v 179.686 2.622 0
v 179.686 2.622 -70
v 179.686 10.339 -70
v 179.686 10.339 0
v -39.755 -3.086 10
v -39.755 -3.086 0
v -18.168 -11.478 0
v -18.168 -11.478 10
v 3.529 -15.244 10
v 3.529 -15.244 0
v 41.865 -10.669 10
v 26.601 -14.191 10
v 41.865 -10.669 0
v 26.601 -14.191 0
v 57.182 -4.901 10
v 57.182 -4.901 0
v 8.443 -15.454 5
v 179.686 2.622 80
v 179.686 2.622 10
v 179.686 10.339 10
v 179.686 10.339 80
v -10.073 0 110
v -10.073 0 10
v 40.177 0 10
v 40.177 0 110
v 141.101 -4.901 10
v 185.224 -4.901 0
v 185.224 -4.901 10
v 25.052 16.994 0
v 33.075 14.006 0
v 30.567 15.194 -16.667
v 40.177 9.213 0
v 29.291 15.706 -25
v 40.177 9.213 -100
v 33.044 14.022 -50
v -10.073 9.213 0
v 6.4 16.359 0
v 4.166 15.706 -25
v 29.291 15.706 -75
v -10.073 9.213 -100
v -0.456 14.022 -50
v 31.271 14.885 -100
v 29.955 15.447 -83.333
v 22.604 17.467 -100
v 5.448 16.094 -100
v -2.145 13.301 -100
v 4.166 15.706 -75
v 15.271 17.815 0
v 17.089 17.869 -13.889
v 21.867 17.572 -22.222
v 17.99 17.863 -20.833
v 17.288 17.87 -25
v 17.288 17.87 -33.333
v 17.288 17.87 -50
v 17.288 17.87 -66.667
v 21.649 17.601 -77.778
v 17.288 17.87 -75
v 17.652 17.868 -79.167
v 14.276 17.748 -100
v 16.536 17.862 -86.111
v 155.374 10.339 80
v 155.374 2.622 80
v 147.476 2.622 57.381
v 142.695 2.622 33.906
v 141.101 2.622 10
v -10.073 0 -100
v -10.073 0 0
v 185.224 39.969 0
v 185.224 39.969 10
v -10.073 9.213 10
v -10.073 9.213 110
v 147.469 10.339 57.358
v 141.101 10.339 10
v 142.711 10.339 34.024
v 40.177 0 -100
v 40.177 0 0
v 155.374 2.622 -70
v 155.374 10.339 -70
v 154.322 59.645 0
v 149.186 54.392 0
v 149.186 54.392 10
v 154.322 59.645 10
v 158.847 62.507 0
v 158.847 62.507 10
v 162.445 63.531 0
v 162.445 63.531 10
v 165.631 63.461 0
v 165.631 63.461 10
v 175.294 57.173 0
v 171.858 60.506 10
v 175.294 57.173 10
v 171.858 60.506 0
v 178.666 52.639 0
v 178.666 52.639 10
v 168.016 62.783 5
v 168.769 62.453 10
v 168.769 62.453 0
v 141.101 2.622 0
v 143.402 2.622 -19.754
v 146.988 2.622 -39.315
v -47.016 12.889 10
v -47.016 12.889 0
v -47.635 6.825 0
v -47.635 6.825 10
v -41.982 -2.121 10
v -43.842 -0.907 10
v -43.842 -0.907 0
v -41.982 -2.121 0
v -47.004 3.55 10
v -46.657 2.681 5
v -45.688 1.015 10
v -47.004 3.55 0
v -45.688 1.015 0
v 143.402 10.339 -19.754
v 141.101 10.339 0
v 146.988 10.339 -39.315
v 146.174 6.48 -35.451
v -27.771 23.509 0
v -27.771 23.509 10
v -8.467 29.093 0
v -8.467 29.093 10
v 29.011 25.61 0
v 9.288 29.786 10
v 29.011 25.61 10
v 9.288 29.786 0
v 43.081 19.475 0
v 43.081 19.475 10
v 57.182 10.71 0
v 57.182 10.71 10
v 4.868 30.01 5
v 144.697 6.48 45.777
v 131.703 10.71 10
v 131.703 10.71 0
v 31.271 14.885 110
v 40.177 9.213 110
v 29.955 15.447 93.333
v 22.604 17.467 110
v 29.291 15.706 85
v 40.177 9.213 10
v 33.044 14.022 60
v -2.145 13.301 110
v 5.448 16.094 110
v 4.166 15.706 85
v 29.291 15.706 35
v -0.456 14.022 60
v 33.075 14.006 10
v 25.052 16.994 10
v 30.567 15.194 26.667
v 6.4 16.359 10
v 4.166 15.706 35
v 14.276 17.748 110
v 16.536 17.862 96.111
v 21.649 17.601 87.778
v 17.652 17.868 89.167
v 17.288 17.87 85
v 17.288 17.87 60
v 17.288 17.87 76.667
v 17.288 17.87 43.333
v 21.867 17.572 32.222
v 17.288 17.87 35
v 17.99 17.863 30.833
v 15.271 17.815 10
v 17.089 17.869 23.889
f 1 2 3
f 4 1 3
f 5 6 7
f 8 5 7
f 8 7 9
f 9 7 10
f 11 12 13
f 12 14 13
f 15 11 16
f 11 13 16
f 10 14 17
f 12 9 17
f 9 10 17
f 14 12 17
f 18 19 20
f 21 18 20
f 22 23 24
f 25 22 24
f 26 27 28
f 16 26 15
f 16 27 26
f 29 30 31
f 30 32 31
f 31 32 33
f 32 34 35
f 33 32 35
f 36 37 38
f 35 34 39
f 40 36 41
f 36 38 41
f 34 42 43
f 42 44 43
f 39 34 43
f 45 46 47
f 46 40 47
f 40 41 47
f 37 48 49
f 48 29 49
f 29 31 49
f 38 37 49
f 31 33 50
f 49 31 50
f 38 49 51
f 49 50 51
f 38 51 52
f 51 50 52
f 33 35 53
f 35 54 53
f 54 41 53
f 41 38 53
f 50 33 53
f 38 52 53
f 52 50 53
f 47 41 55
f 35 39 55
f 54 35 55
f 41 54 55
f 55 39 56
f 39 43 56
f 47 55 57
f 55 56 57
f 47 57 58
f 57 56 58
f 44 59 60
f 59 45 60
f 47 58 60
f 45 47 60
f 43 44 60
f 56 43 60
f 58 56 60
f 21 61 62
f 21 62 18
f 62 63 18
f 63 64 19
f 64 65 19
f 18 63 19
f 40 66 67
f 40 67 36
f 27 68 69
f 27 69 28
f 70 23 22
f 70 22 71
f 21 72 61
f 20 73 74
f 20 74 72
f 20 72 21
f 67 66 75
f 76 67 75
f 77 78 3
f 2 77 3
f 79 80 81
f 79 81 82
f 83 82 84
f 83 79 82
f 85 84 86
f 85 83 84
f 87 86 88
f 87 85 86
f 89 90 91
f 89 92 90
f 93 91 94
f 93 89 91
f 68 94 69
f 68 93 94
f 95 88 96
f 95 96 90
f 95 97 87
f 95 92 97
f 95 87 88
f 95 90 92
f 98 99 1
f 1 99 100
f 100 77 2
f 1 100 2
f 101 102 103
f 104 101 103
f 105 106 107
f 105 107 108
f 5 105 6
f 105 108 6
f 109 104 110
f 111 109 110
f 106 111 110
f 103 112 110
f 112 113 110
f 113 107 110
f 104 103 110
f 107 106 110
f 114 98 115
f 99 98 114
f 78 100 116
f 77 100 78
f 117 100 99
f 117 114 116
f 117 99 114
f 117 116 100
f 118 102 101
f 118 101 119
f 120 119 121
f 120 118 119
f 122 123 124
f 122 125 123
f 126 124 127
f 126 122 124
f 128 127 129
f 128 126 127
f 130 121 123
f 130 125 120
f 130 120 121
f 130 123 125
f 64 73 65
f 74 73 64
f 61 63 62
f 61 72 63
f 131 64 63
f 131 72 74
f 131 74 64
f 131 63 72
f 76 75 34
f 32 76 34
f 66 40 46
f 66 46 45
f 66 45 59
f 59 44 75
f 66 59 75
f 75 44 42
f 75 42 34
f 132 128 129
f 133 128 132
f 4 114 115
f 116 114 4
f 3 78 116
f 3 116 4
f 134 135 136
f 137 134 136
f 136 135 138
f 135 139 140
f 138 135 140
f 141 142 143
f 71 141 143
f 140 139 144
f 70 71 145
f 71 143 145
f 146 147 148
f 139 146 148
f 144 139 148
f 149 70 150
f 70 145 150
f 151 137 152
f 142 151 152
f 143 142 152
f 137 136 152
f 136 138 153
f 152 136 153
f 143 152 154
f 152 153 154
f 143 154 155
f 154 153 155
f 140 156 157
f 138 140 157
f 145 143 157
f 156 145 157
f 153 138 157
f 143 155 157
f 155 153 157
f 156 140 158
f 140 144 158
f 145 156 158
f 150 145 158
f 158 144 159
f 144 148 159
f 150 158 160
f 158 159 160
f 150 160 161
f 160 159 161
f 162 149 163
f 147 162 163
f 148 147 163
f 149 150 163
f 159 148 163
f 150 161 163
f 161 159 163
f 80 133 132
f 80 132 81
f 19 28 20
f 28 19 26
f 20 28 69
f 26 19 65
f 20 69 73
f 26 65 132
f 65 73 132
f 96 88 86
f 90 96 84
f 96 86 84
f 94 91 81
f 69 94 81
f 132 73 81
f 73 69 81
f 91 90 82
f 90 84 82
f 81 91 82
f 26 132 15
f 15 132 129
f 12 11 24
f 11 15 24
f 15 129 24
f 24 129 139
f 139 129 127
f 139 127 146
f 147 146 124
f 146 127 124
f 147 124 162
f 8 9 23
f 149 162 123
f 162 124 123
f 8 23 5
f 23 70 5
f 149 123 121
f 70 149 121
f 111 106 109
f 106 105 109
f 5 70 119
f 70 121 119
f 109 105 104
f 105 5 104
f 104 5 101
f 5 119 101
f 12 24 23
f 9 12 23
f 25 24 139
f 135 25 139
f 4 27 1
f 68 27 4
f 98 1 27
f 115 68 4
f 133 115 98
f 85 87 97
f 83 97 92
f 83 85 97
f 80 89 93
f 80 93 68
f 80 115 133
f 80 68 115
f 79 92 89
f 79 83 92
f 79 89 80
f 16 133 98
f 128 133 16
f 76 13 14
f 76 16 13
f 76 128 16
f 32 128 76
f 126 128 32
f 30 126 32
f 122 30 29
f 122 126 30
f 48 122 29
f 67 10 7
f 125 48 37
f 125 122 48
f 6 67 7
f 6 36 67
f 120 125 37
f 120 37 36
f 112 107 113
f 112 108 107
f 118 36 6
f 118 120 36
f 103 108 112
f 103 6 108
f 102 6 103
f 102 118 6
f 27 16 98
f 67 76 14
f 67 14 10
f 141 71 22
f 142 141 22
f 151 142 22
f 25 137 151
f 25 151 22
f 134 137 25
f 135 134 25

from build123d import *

# Parameters (mm, degrees)
BOSS_EXTRUDE1_DEPTH      = 10
BOSS_EXTRUDE4_DEPTH      = 110
BOSS_EXTRUDE4_DEPTH_BACK = 100
SKETCH2_W                = 50.249872444
SKETCH2_H                = 9.213429789
BOSS_EXTRUDE6_DEPTH      = 210
BOSS_EXTRUDE9_DEPTH      = 70
BOSS_EXTRUDE9_DEPTH_BACK = 80
SKETCH6_W                = 38.58561731
SKETCH6_H                = 7.717123462
CUT_EXTRUDE1_DEPTH       = 70
CUT_EXTRUDE2_DEPTH       = 222.915349689
CUT_EXTRUDE2_DEPTH_BACK  = 222.915349689


with BuildPart() as part:
    # Sketch1 → Boss-Extrude1 (new body)
    with BuildSketch(Plane.XY):
        with BuildLine():
            Line((57.181832049, 10.710247908), (131.703459222, 10.710247908))
            Line((131.703459222, 10.710247908), (149.186074684, 54.392465481))
            add(Edge.make_bspline(
                [(149.186074684, 54.392465481), (168.827192519, 78.384539795), (185.224129689, 39.969217472)],
                knots=[0, 0, 0, 1, 1, 1], degree=2))
            Line((185.224129689, 39.969217472), (185.224129689, -4.90129989))
            Line((185.224129689, -4.90129989), (57.181832049, -4.90129989))
            add(Edge.make_bspline(
                [(-39.754987996, -3.086003634), (8.172307478, -26.913609431), (57.181832049, -4.90129989)],
                knots=[0, 0, 0, 1, 1, 1], degree=2))
            add(Edge.make_bspline(
                [(-47.016173018, 12.888603414), (-49.928971692, 0.460306463), (-39.754987996, -3.086003634)],
                knots=[0, 0, 0, 1, 1, 1], degree=2))
            add(Edge.make_bspline(
                [(-47.016173018, 12.888603414), (4.654032658, 48.21998755), (57.181832049, 10.710247908)],
                knots=[0, 0, 0, 1, 1, 1], degree=2))
        make_face()
    extrude(amount=BOSS_EXTRUDE1_DEPTH)

    # Sketch2 → Boss-Extrude4 (add, two sides: drawn at the far end of the back side and taken through both)
    with BuildSketch(Plane.XY.offset(-BOSS_EXTRUDE4_DEPTH_BACK)):
        with Locations((15.052306438, 4.606714895)):
            Rectangle(SKETCH2_W, SKETCH2_H)
    extrude(amount=BOSS_EXTRUDE4_DEPTH + BOSS_EXTRUDE4_DEPTH_BACK)

    # Sketch3 → Boss-Extrude6 (add)
    with BuildSketch(Plane(origin=(0, 0, -100), x_dir=(-1, 0, 0), z_dir=(0, 0, -1))):
        with BuildLine():
            Line((-40.17724266, 9.213429789), (-40.17724266, 0))
            Line((-40.17724266, 0), (10.072629784, 0))
            Line((10.072629784, 0), (10.072629784, 9.213429789))
            add(Edge.make_bspline(
                [(-40.17724266, 9.213429789), (-19.522810461, 26.526032518), (10.072629784, 9.213429789)],
                knots=[0, 0, 0, 1, 1, 1], degree=2))
        make_face()
    extrude(amount=-BOSS_EXTRUDE6_DEPTH)

    # Sketch6 → Boss-Extrude9 (add, two sides: drawn at the far end of the back side and taken through both)
    with BuildSketch(Plane.XY.offset(10).offset(-BOSS_EXTRUDE9_DEPTH_BACK)):
        with Locations((160.393476949, 6.480433212)):
            Rectangle(SKETCH6_W, SKETCH6_H)
    extrude(amount=BOSS_EXTRUDE9_DEPTH + BOSS_EXTRUDE9_DEPTH_BACK)

    # Sketch7 → Cut-Extrude1 (cut)
    with BuildSketch(Plane(origin=(0, 10.338994943, 0), x_dir=(1, 0, 0), z_dir=(0, 1, 0))):
        with BuildLine():
            Line((141.100668294, -10), (141.100668294, -80))
            Line((141.100668294, -80), (155.374228958, -80))
            add(Edge.make_bspline(
                [(141.100668294, -10), (141.156131379, -46.554762938), (155.374228958, -80)],
                knots=[0, 0, 0, 1, 1, 1], degree=2))
        make_face()
    extrude(amount=-CUT_EXTRUDE1_DEPTH, mode=Mode.SUBTRACT)

    # Sketch10 → Cut-Extrude2 (cut, two sides: drawn at the far end of the back side and taken through both)
    with BuildSketch(Plane(origin=(0, 10.338994943, 0), x_dir=(1, 0, 0), z_dir=(0, 1, 0)).offset(-CUT_EXTRUDE2_DEPTH_BACK)):
        with BuildLine():
            Line((141.100668294, 70), (141.100668294, 0))
            add(Edge.make_bspline(
                [(141.100668294, 0), (144.11108971, 35.90170366), (155.374228958, 70)],
                knots=[0, 0, 0, 1, 1, 1], degree=2))
            Line((155.374228958, 70), (141.100668294, 70))
        make_face()
    extrude(amount=CUT_EXTRUDE2_DEPTH + CUT_EXTRUDE2_DEPTH_BACK, mode=Mode.SUBTRACT)


solid = part.part
